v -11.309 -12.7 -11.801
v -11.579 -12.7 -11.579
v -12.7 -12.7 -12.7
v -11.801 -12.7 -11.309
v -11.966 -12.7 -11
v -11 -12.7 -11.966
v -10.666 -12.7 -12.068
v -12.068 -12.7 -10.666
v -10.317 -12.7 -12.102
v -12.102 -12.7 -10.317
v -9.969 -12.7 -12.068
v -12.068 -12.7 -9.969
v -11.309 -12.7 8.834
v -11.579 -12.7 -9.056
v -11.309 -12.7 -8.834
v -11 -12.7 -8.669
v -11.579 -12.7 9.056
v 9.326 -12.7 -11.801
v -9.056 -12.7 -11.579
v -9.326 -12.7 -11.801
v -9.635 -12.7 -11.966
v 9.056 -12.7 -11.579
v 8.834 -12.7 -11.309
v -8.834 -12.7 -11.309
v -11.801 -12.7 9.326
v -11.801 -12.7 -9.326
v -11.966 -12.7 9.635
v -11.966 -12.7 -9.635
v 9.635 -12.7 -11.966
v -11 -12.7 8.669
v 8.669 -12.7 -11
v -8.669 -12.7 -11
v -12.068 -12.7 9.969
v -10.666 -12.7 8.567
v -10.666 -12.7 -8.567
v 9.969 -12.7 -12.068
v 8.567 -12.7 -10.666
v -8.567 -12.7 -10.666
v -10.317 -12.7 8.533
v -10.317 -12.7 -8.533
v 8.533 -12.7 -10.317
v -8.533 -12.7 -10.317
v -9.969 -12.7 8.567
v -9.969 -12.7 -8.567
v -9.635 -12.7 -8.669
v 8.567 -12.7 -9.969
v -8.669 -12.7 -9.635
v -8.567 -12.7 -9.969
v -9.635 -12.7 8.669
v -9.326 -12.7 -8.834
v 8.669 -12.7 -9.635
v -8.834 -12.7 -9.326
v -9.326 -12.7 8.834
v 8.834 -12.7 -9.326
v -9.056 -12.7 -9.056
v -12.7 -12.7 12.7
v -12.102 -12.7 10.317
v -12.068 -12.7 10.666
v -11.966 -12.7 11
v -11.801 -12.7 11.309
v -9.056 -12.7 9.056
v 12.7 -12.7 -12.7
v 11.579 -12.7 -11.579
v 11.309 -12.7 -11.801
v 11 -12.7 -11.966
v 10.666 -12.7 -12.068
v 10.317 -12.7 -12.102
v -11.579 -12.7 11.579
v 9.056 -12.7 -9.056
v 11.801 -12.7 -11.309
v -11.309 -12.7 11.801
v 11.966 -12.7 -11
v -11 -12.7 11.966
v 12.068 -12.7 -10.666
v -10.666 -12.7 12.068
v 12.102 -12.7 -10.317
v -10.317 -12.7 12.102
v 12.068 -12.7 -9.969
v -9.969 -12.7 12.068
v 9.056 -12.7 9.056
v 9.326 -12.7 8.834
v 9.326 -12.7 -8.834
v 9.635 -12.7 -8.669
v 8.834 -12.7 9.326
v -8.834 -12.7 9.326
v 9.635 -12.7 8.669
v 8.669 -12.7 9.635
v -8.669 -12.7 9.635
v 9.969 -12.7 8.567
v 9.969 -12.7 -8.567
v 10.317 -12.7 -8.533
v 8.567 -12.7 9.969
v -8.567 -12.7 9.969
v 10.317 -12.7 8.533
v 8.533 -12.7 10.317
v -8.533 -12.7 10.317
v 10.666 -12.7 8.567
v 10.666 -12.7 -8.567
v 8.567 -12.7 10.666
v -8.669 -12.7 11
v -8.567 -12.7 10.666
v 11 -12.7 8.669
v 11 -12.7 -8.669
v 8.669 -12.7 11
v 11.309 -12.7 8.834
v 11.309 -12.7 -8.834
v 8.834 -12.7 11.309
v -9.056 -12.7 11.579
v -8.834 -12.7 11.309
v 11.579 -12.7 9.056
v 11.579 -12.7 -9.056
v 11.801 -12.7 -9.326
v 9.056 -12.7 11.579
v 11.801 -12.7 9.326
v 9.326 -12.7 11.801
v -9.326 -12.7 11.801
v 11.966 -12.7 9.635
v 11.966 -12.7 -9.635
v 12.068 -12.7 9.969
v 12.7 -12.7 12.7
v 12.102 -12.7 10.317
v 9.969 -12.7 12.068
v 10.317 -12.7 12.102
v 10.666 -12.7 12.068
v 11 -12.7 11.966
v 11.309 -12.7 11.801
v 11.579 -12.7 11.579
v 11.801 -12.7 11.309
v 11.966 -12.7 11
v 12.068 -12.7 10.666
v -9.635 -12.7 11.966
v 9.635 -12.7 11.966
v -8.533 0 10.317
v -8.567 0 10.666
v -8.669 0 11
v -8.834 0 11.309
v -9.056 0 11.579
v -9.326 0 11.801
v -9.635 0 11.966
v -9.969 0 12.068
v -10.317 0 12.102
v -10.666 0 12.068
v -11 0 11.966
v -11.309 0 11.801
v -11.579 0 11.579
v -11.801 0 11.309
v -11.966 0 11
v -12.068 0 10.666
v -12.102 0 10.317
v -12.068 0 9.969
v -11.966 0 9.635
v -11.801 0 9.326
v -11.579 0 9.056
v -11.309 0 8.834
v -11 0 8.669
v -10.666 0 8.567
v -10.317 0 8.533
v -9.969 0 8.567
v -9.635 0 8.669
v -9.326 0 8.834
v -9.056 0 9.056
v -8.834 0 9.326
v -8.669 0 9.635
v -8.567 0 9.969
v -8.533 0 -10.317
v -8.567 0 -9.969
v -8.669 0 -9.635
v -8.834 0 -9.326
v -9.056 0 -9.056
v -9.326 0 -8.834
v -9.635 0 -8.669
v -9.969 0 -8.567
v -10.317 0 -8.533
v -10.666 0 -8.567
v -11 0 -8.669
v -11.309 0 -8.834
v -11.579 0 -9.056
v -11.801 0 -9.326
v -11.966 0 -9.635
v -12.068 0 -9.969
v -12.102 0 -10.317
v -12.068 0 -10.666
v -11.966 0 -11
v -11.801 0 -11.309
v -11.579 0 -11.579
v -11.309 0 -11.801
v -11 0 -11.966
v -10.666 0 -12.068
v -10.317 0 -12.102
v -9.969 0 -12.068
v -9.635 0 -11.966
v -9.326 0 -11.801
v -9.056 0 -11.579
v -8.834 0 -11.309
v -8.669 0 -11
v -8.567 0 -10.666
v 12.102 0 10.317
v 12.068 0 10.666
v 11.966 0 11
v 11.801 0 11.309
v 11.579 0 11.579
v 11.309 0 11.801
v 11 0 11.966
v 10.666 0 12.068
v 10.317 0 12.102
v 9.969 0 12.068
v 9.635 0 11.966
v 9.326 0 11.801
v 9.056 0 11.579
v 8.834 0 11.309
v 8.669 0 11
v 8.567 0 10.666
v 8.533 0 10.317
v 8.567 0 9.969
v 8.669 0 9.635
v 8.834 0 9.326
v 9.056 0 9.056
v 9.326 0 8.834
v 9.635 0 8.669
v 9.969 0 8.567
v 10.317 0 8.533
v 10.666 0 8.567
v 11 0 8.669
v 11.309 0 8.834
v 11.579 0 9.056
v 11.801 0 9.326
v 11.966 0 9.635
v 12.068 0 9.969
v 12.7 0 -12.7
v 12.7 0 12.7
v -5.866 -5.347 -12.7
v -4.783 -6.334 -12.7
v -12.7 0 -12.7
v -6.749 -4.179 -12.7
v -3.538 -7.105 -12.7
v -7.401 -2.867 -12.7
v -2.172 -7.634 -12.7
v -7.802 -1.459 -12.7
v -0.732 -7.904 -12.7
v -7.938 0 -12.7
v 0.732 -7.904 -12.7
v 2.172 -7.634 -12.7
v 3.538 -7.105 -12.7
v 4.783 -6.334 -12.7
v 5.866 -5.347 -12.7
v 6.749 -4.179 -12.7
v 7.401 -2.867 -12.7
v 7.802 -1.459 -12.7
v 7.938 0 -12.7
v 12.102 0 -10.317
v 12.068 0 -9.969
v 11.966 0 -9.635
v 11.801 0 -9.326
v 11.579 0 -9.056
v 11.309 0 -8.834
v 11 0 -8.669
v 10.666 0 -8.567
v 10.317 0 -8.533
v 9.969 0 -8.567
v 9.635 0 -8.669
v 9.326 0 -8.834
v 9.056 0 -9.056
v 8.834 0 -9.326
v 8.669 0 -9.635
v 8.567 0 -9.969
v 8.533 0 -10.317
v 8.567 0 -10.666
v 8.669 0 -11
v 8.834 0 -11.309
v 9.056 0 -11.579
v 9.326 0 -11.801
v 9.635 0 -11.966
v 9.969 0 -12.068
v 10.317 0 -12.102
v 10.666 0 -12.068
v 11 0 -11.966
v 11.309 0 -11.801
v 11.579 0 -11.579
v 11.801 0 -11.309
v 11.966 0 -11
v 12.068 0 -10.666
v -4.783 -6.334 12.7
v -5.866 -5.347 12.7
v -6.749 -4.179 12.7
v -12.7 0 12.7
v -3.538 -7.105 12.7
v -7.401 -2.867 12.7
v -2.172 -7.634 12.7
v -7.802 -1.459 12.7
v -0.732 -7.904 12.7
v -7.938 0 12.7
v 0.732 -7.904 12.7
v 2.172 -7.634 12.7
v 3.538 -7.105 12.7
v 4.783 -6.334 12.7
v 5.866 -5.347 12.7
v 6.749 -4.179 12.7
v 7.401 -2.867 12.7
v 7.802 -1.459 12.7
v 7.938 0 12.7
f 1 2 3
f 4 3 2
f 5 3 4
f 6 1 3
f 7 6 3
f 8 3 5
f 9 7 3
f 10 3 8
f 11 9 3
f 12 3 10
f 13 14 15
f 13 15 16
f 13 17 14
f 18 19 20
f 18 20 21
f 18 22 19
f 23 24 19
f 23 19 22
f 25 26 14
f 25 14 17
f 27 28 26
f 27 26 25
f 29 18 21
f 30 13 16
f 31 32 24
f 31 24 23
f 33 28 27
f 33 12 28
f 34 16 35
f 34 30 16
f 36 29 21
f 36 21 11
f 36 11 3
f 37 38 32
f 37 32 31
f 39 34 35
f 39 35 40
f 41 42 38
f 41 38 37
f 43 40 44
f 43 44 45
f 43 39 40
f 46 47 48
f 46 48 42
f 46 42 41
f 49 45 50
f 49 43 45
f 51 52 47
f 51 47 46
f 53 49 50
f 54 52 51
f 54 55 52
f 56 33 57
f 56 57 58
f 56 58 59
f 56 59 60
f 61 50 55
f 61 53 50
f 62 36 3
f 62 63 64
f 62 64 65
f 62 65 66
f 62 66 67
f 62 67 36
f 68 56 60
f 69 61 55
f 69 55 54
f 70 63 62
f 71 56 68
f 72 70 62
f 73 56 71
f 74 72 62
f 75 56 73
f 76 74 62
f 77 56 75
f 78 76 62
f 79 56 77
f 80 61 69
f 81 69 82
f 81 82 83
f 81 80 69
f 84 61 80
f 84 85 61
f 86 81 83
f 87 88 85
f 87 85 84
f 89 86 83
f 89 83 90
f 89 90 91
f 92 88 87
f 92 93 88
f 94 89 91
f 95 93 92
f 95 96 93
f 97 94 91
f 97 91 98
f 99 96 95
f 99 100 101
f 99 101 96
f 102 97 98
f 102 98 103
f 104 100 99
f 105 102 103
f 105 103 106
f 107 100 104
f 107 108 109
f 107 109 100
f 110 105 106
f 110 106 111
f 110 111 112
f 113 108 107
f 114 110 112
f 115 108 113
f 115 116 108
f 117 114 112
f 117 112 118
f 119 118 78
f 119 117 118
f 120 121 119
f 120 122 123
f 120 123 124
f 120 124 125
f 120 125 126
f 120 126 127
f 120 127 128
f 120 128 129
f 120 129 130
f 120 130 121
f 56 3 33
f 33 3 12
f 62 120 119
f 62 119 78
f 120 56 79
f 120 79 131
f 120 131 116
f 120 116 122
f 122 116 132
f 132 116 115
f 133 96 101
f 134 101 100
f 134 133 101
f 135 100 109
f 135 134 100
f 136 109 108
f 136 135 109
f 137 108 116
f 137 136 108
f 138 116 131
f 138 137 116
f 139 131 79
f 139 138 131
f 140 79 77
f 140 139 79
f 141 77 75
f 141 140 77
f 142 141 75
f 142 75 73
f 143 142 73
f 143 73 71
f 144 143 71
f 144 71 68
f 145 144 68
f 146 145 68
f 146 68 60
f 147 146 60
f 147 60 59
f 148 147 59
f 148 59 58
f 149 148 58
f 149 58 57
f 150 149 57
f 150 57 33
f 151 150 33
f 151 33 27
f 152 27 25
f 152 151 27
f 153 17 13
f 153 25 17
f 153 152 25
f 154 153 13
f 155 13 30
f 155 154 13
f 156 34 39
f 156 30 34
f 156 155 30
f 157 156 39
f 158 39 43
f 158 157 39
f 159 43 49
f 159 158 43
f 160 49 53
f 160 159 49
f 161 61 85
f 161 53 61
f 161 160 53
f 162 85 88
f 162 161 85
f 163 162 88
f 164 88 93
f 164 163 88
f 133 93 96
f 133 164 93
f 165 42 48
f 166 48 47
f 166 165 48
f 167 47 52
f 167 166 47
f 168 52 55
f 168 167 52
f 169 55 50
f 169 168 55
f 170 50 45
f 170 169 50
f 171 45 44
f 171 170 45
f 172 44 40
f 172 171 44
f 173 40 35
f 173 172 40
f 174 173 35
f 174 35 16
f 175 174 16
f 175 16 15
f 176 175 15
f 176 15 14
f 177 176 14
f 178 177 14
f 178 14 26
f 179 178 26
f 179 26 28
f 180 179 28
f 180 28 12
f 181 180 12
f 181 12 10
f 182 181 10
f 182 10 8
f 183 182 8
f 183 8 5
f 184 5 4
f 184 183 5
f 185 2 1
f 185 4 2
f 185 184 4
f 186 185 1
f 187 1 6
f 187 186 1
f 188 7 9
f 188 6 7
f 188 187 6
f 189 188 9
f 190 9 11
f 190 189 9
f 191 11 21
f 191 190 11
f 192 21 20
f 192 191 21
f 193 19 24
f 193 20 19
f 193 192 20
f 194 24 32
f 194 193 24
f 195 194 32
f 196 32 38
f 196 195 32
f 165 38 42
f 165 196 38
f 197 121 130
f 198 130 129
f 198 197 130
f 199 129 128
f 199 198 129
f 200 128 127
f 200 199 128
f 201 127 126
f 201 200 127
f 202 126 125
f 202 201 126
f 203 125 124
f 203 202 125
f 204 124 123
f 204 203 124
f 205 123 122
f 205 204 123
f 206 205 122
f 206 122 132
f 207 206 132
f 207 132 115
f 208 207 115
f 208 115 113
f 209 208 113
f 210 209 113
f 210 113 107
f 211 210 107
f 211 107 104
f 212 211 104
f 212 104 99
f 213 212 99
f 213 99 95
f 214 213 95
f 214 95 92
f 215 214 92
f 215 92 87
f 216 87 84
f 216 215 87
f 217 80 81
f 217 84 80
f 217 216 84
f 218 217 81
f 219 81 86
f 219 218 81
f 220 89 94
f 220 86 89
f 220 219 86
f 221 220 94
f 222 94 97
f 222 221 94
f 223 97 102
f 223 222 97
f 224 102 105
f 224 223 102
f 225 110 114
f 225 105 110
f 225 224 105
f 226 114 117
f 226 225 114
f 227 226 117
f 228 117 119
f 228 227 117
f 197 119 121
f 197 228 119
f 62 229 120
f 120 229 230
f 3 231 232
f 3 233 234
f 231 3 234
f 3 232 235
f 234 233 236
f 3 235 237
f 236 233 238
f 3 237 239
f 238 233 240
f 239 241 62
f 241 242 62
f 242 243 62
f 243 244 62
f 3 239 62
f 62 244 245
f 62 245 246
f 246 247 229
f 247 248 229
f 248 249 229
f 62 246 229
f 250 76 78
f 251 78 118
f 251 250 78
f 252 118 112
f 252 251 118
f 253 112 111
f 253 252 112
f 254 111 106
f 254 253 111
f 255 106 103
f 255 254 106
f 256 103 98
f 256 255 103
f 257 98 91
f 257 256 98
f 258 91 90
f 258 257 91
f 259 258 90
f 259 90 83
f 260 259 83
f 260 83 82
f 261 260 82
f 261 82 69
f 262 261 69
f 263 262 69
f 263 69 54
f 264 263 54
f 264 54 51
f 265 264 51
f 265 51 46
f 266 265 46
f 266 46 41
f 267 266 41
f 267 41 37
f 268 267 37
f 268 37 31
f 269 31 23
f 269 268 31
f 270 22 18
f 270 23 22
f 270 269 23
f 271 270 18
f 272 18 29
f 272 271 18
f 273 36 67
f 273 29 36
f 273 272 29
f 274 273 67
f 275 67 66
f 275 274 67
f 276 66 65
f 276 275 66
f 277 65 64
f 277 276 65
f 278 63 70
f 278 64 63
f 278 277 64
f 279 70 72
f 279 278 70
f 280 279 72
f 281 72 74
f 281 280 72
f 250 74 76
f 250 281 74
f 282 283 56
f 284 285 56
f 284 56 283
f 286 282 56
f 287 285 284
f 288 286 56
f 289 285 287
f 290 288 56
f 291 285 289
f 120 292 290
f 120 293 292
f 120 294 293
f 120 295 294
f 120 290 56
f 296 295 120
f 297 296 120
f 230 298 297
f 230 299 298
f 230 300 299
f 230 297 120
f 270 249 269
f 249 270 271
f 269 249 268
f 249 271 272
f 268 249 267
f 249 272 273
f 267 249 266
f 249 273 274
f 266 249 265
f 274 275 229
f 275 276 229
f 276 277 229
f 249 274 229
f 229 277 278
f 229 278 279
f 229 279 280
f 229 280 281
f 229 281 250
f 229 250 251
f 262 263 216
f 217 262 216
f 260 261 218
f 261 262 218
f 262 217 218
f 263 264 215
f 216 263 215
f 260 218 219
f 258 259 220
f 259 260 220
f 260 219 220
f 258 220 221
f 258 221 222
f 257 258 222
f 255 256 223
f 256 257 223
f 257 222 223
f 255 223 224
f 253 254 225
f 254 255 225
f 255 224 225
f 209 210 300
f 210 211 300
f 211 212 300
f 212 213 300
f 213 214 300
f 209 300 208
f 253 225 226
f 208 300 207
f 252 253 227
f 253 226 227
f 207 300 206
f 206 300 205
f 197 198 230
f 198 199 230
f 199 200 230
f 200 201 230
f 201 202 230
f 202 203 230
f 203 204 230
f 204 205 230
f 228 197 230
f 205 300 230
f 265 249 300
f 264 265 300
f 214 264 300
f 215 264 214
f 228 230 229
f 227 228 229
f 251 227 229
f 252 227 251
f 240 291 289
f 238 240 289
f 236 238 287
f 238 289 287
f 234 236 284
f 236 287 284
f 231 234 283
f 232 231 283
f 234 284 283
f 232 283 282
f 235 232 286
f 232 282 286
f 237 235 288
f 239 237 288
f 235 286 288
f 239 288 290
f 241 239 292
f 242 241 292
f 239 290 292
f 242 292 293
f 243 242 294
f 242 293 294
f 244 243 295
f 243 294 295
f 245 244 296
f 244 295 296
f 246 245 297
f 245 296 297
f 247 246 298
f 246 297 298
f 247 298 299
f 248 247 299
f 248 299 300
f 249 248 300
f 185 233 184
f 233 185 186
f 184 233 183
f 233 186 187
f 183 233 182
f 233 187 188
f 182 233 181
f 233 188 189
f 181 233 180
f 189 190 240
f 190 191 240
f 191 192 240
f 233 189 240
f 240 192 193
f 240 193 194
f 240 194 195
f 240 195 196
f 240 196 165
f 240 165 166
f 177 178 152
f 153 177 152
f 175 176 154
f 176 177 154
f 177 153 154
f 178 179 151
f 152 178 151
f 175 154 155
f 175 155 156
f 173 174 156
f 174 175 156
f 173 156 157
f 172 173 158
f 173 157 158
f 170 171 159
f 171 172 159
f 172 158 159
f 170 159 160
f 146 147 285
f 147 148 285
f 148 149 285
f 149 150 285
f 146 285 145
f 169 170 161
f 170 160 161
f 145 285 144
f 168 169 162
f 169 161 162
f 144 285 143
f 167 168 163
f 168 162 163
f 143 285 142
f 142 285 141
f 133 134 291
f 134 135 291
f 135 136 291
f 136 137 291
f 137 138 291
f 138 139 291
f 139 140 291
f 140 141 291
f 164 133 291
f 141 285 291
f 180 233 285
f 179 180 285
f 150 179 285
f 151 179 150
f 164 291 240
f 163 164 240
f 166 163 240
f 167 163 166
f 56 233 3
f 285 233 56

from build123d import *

# Parameters (mm, degrees)
F0_W     = 25.4
F0_H     = 25.4
F1_DEPTH = 12.7
F3_DEPTH = 25.401
F4_R     = 1.78435
F5_DEPTH = 12.701


with BuildPart() as f1:
    # F0 (on Front) → F1 (new body)
    with BuildSketch(Plane.XZ):
        Rectangle(F0_W, F0_H)
    extrude(amount=F1_DEPTH)

    # F2 (on face) → F3 (cut, through all)
    with BuildSketch(Plane.XY.offset(12.7)):
        with BuildLine():
            ThreePointArc((-7.9375, 0), (0, -7.9375), (7.9375, 0))
            Line((7.9375, 0), (-7.9375, 0))
        make_face()
        with BuildLine():
            Line((-7.9375, 0), (7.9375, 0))
            ThreePointArc((7.9375, 0), (0, 7.9375), (-7.9375, 0))
        make_face()
    extrude(amount=-F3_DEPTH, mode=Mode.SUBTRACT)

    # F4 (on Front) → F5 (cut, through all)
    with BuildSketch(Plane.XZ):
        with Locations((-10.31748, 10.31748)):
            Circle(F4_R)
        with Locations((-10.31748, -10.31748)):
            Circle(F4_R)
        with Locations((10.31748, -10.31748)):
            Circle(F4_R)
        with Locations((10.31748, 10.31748)):
            Circle(F4_R)
    extrude(amount=F5_DEPTH, mode=Mode.SUBTRACT)


solid = f1.part
